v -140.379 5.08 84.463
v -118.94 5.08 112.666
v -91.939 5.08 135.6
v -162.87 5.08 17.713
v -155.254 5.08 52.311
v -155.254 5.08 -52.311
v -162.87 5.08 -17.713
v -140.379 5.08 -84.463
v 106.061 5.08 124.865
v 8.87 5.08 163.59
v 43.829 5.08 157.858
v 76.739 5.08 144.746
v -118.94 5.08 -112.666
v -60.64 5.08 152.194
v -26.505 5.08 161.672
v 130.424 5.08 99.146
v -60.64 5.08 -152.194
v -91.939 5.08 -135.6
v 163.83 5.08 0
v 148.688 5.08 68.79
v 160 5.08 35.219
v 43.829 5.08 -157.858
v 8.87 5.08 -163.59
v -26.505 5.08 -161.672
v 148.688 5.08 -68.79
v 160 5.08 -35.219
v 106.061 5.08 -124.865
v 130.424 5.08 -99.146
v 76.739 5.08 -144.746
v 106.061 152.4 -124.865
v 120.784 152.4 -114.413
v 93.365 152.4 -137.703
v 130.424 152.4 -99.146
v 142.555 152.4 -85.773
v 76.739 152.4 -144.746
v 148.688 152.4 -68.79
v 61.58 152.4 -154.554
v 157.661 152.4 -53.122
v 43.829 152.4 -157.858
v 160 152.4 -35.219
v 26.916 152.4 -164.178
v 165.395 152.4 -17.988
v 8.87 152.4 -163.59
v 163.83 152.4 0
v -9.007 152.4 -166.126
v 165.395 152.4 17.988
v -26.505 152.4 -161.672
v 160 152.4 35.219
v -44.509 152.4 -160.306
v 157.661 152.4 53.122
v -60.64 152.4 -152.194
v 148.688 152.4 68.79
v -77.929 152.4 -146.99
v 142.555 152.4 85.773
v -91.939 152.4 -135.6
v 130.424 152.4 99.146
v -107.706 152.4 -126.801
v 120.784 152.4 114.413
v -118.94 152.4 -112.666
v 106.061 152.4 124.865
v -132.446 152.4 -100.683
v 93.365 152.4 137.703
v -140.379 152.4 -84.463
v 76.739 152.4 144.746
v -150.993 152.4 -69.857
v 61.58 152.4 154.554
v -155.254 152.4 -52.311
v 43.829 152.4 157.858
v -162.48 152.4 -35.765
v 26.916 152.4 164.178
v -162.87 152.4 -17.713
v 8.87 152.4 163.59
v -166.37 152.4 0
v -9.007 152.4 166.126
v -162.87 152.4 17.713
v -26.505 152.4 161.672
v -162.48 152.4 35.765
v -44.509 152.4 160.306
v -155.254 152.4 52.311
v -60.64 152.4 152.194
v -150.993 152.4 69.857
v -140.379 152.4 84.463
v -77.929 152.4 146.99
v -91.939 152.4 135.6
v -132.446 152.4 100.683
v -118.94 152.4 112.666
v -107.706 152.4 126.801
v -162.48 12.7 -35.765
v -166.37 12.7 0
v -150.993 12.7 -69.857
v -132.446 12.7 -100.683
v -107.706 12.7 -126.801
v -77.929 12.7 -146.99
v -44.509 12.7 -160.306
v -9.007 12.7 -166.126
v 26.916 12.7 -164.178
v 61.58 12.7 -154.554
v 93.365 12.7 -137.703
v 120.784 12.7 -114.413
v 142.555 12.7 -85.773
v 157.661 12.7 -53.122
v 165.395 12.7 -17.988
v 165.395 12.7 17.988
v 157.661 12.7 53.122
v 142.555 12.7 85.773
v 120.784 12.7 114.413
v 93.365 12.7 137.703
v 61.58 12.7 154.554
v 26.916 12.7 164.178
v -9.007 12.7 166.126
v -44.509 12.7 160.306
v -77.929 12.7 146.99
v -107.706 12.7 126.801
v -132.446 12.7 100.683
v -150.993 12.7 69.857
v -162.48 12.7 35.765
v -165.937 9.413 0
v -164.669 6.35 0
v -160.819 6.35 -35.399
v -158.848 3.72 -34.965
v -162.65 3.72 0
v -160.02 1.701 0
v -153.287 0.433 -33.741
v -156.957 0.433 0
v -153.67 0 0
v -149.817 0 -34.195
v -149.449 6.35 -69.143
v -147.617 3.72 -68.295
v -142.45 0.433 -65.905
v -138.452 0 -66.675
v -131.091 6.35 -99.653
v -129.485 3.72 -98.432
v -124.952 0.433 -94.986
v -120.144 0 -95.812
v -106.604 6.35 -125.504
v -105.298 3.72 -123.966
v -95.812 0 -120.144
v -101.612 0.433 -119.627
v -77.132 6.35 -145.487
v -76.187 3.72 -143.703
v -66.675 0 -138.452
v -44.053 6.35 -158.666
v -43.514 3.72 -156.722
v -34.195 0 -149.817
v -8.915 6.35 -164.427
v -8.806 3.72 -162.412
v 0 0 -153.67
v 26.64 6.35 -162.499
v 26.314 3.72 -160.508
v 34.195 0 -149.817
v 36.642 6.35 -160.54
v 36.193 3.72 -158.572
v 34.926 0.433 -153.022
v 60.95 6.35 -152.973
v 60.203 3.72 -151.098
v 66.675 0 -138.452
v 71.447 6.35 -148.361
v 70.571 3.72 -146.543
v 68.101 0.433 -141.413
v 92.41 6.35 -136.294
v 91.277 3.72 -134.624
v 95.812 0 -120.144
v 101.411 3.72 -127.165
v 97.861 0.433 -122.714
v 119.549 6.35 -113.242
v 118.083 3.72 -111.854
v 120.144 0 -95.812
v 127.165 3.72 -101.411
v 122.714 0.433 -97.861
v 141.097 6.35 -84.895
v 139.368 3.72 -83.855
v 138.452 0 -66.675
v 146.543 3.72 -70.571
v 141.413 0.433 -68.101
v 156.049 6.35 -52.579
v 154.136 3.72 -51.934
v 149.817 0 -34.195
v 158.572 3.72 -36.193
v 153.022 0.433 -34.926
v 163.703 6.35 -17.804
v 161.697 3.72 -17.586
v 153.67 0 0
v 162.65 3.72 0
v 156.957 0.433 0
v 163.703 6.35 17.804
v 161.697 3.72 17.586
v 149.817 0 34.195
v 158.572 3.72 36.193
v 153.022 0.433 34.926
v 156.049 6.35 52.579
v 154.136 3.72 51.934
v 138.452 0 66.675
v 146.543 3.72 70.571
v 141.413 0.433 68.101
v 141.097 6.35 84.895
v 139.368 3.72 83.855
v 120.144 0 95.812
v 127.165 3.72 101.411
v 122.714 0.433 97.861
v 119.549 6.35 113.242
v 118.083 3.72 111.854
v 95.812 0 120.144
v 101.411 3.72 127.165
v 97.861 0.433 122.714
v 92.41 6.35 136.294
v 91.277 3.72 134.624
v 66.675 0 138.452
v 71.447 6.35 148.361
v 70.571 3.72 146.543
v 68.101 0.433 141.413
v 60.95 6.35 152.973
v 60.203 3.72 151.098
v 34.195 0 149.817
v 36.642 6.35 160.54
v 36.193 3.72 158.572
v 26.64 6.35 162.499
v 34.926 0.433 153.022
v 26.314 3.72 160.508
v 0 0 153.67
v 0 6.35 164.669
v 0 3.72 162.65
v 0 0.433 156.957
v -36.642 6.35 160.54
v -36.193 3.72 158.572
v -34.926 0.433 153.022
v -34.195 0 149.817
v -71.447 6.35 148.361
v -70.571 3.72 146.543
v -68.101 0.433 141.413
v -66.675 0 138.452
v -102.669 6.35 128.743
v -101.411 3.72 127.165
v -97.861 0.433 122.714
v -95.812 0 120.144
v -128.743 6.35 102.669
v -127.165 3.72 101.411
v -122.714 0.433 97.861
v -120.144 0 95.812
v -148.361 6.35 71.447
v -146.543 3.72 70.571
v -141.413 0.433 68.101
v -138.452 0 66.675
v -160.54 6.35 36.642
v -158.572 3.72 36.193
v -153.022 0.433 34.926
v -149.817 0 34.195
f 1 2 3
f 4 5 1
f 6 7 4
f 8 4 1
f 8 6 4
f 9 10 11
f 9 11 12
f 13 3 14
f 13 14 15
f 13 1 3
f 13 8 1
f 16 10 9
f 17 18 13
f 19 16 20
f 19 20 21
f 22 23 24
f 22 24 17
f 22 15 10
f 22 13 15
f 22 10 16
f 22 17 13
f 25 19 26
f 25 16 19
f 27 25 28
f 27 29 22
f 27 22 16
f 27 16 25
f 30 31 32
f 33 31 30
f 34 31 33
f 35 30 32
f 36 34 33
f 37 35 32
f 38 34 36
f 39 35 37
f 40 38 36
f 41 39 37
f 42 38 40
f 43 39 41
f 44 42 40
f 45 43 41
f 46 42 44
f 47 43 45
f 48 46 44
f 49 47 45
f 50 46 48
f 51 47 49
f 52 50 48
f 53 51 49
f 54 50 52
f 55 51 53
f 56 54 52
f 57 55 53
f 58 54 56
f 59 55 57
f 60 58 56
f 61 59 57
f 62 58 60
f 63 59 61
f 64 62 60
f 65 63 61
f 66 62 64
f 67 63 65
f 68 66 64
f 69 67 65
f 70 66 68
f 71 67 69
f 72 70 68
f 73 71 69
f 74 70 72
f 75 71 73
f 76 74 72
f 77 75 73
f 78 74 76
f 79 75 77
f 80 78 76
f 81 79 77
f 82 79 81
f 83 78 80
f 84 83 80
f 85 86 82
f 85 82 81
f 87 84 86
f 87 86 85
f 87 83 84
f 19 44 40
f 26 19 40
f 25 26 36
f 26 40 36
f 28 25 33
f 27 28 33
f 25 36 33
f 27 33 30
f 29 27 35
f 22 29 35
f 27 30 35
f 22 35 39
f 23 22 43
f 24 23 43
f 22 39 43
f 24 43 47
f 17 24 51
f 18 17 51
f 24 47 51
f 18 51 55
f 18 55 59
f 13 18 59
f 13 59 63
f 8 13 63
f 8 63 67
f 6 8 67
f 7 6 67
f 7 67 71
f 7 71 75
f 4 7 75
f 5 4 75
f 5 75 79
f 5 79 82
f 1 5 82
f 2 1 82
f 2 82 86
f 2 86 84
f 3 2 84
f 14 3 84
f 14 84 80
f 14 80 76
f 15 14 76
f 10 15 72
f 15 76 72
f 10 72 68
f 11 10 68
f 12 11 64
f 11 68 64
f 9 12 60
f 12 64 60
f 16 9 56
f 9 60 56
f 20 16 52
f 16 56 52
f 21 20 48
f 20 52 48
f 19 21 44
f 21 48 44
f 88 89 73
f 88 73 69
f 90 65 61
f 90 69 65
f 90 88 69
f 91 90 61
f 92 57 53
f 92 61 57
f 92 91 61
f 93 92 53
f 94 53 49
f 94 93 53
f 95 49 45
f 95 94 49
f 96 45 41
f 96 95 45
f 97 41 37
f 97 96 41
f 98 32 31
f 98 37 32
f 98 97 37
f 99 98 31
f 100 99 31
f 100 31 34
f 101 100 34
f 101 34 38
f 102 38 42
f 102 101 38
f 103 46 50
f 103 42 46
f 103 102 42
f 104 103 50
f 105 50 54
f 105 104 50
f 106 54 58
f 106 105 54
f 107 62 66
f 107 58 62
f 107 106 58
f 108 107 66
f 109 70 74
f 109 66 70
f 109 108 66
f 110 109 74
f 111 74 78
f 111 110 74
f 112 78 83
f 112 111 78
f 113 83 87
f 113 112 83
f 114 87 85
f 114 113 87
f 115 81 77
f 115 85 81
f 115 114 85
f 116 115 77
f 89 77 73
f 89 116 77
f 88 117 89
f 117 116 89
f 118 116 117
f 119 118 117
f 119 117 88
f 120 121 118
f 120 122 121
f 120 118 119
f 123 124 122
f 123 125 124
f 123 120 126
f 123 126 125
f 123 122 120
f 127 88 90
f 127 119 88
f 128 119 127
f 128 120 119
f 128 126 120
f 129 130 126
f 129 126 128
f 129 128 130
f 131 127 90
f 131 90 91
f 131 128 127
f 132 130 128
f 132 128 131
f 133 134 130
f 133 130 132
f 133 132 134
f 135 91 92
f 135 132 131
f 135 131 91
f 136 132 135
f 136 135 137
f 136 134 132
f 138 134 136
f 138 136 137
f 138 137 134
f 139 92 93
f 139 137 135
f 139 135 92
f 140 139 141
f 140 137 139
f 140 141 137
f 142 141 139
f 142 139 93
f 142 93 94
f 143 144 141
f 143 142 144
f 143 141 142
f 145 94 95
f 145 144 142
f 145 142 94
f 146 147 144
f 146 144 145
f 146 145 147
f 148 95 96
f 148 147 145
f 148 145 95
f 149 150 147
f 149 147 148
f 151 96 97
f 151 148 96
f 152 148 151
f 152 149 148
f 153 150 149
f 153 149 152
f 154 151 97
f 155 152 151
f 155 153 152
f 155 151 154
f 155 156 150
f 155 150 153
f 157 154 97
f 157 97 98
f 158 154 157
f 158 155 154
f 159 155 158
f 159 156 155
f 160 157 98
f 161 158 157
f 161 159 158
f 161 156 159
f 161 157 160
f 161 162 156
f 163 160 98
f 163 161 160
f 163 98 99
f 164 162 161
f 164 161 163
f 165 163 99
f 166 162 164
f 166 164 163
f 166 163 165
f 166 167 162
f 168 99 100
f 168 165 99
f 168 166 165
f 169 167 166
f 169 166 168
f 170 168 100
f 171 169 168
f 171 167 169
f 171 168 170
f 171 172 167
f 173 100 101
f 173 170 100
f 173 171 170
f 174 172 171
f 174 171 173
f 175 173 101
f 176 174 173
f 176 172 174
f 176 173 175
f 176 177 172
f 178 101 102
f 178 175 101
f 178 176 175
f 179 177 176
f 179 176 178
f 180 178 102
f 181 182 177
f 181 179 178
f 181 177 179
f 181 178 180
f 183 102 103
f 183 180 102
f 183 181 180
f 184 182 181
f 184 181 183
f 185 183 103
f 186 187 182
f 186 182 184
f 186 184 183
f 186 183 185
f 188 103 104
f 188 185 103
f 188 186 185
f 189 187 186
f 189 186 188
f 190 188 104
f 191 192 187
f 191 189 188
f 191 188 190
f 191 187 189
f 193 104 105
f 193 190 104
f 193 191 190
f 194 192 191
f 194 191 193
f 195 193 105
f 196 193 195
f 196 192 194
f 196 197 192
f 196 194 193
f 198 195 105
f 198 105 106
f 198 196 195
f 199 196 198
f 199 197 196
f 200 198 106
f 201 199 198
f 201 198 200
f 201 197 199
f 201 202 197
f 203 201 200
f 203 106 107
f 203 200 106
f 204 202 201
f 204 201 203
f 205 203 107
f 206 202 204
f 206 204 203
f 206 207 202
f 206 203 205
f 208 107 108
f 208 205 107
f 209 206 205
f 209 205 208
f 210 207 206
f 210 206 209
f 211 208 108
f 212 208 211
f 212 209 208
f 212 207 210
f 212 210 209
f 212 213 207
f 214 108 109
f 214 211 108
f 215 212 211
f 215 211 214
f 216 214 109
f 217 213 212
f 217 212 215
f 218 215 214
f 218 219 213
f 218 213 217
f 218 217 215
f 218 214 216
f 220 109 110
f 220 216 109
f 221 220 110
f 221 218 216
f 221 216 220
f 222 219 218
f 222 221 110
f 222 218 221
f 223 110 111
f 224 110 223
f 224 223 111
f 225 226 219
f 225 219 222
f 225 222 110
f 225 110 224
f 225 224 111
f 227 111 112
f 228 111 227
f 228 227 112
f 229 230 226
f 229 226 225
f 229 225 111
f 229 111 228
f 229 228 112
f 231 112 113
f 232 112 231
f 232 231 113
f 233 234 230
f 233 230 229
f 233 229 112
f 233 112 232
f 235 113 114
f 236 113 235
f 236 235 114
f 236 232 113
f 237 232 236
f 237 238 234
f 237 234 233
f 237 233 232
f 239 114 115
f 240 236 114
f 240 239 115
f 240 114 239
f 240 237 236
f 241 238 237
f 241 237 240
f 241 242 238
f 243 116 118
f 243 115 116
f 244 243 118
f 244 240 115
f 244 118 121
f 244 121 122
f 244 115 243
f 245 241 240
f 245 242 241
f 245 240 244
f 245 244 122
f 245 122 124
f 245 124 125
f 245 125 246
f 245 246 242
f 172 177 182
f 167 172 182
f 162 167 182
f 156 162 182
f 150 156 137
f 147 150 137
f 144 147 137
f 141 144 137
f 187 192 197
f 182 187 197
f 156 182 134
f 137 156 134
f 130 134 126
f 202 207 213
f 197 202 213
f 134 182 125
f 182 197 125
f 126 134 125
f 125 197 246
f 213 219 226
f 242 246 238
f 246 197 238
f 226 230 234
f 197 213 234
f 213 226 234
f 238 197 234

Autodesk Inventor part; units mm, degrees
ref_plane "YZ Plane" through (0, 0, 0) normal (1, 0, 0) x (0, 1, 0)
ref_plane "XZ Plane" through (0, 0, 0) normal (0, 1, 0) x (-1, 0, 0)
ref_plane "XY Plane" through (0, 0, 0) normal (0, 0, 1) x (1, 0, 0)
sketch "Sketch1" plane through (0, 0, 0) normal (0, 1, 0) x (-1, 0, 0)
  circle A0 centre (0, 0) radius 166.37
  dimension "d0" = 332.74
extrude "Extrusion1" add sketch "Sketch1" along normal blind 152.4
sketch "Sketch2" plane through (0, 152.4, 0) normal (0, 1, 0) x (1, 0, 0)
  circle A0 centre (0, 0) radius 163.83
  dimension "d3" = 327.66
extrude "Extrusion2" cut sketch "Sketch2" against normal blind 147.32
fillet "Fillet1" radius 12.7 1 edges at (166.37, 0, 0)
properties part number "cover" material "Acetal Resin, White"
